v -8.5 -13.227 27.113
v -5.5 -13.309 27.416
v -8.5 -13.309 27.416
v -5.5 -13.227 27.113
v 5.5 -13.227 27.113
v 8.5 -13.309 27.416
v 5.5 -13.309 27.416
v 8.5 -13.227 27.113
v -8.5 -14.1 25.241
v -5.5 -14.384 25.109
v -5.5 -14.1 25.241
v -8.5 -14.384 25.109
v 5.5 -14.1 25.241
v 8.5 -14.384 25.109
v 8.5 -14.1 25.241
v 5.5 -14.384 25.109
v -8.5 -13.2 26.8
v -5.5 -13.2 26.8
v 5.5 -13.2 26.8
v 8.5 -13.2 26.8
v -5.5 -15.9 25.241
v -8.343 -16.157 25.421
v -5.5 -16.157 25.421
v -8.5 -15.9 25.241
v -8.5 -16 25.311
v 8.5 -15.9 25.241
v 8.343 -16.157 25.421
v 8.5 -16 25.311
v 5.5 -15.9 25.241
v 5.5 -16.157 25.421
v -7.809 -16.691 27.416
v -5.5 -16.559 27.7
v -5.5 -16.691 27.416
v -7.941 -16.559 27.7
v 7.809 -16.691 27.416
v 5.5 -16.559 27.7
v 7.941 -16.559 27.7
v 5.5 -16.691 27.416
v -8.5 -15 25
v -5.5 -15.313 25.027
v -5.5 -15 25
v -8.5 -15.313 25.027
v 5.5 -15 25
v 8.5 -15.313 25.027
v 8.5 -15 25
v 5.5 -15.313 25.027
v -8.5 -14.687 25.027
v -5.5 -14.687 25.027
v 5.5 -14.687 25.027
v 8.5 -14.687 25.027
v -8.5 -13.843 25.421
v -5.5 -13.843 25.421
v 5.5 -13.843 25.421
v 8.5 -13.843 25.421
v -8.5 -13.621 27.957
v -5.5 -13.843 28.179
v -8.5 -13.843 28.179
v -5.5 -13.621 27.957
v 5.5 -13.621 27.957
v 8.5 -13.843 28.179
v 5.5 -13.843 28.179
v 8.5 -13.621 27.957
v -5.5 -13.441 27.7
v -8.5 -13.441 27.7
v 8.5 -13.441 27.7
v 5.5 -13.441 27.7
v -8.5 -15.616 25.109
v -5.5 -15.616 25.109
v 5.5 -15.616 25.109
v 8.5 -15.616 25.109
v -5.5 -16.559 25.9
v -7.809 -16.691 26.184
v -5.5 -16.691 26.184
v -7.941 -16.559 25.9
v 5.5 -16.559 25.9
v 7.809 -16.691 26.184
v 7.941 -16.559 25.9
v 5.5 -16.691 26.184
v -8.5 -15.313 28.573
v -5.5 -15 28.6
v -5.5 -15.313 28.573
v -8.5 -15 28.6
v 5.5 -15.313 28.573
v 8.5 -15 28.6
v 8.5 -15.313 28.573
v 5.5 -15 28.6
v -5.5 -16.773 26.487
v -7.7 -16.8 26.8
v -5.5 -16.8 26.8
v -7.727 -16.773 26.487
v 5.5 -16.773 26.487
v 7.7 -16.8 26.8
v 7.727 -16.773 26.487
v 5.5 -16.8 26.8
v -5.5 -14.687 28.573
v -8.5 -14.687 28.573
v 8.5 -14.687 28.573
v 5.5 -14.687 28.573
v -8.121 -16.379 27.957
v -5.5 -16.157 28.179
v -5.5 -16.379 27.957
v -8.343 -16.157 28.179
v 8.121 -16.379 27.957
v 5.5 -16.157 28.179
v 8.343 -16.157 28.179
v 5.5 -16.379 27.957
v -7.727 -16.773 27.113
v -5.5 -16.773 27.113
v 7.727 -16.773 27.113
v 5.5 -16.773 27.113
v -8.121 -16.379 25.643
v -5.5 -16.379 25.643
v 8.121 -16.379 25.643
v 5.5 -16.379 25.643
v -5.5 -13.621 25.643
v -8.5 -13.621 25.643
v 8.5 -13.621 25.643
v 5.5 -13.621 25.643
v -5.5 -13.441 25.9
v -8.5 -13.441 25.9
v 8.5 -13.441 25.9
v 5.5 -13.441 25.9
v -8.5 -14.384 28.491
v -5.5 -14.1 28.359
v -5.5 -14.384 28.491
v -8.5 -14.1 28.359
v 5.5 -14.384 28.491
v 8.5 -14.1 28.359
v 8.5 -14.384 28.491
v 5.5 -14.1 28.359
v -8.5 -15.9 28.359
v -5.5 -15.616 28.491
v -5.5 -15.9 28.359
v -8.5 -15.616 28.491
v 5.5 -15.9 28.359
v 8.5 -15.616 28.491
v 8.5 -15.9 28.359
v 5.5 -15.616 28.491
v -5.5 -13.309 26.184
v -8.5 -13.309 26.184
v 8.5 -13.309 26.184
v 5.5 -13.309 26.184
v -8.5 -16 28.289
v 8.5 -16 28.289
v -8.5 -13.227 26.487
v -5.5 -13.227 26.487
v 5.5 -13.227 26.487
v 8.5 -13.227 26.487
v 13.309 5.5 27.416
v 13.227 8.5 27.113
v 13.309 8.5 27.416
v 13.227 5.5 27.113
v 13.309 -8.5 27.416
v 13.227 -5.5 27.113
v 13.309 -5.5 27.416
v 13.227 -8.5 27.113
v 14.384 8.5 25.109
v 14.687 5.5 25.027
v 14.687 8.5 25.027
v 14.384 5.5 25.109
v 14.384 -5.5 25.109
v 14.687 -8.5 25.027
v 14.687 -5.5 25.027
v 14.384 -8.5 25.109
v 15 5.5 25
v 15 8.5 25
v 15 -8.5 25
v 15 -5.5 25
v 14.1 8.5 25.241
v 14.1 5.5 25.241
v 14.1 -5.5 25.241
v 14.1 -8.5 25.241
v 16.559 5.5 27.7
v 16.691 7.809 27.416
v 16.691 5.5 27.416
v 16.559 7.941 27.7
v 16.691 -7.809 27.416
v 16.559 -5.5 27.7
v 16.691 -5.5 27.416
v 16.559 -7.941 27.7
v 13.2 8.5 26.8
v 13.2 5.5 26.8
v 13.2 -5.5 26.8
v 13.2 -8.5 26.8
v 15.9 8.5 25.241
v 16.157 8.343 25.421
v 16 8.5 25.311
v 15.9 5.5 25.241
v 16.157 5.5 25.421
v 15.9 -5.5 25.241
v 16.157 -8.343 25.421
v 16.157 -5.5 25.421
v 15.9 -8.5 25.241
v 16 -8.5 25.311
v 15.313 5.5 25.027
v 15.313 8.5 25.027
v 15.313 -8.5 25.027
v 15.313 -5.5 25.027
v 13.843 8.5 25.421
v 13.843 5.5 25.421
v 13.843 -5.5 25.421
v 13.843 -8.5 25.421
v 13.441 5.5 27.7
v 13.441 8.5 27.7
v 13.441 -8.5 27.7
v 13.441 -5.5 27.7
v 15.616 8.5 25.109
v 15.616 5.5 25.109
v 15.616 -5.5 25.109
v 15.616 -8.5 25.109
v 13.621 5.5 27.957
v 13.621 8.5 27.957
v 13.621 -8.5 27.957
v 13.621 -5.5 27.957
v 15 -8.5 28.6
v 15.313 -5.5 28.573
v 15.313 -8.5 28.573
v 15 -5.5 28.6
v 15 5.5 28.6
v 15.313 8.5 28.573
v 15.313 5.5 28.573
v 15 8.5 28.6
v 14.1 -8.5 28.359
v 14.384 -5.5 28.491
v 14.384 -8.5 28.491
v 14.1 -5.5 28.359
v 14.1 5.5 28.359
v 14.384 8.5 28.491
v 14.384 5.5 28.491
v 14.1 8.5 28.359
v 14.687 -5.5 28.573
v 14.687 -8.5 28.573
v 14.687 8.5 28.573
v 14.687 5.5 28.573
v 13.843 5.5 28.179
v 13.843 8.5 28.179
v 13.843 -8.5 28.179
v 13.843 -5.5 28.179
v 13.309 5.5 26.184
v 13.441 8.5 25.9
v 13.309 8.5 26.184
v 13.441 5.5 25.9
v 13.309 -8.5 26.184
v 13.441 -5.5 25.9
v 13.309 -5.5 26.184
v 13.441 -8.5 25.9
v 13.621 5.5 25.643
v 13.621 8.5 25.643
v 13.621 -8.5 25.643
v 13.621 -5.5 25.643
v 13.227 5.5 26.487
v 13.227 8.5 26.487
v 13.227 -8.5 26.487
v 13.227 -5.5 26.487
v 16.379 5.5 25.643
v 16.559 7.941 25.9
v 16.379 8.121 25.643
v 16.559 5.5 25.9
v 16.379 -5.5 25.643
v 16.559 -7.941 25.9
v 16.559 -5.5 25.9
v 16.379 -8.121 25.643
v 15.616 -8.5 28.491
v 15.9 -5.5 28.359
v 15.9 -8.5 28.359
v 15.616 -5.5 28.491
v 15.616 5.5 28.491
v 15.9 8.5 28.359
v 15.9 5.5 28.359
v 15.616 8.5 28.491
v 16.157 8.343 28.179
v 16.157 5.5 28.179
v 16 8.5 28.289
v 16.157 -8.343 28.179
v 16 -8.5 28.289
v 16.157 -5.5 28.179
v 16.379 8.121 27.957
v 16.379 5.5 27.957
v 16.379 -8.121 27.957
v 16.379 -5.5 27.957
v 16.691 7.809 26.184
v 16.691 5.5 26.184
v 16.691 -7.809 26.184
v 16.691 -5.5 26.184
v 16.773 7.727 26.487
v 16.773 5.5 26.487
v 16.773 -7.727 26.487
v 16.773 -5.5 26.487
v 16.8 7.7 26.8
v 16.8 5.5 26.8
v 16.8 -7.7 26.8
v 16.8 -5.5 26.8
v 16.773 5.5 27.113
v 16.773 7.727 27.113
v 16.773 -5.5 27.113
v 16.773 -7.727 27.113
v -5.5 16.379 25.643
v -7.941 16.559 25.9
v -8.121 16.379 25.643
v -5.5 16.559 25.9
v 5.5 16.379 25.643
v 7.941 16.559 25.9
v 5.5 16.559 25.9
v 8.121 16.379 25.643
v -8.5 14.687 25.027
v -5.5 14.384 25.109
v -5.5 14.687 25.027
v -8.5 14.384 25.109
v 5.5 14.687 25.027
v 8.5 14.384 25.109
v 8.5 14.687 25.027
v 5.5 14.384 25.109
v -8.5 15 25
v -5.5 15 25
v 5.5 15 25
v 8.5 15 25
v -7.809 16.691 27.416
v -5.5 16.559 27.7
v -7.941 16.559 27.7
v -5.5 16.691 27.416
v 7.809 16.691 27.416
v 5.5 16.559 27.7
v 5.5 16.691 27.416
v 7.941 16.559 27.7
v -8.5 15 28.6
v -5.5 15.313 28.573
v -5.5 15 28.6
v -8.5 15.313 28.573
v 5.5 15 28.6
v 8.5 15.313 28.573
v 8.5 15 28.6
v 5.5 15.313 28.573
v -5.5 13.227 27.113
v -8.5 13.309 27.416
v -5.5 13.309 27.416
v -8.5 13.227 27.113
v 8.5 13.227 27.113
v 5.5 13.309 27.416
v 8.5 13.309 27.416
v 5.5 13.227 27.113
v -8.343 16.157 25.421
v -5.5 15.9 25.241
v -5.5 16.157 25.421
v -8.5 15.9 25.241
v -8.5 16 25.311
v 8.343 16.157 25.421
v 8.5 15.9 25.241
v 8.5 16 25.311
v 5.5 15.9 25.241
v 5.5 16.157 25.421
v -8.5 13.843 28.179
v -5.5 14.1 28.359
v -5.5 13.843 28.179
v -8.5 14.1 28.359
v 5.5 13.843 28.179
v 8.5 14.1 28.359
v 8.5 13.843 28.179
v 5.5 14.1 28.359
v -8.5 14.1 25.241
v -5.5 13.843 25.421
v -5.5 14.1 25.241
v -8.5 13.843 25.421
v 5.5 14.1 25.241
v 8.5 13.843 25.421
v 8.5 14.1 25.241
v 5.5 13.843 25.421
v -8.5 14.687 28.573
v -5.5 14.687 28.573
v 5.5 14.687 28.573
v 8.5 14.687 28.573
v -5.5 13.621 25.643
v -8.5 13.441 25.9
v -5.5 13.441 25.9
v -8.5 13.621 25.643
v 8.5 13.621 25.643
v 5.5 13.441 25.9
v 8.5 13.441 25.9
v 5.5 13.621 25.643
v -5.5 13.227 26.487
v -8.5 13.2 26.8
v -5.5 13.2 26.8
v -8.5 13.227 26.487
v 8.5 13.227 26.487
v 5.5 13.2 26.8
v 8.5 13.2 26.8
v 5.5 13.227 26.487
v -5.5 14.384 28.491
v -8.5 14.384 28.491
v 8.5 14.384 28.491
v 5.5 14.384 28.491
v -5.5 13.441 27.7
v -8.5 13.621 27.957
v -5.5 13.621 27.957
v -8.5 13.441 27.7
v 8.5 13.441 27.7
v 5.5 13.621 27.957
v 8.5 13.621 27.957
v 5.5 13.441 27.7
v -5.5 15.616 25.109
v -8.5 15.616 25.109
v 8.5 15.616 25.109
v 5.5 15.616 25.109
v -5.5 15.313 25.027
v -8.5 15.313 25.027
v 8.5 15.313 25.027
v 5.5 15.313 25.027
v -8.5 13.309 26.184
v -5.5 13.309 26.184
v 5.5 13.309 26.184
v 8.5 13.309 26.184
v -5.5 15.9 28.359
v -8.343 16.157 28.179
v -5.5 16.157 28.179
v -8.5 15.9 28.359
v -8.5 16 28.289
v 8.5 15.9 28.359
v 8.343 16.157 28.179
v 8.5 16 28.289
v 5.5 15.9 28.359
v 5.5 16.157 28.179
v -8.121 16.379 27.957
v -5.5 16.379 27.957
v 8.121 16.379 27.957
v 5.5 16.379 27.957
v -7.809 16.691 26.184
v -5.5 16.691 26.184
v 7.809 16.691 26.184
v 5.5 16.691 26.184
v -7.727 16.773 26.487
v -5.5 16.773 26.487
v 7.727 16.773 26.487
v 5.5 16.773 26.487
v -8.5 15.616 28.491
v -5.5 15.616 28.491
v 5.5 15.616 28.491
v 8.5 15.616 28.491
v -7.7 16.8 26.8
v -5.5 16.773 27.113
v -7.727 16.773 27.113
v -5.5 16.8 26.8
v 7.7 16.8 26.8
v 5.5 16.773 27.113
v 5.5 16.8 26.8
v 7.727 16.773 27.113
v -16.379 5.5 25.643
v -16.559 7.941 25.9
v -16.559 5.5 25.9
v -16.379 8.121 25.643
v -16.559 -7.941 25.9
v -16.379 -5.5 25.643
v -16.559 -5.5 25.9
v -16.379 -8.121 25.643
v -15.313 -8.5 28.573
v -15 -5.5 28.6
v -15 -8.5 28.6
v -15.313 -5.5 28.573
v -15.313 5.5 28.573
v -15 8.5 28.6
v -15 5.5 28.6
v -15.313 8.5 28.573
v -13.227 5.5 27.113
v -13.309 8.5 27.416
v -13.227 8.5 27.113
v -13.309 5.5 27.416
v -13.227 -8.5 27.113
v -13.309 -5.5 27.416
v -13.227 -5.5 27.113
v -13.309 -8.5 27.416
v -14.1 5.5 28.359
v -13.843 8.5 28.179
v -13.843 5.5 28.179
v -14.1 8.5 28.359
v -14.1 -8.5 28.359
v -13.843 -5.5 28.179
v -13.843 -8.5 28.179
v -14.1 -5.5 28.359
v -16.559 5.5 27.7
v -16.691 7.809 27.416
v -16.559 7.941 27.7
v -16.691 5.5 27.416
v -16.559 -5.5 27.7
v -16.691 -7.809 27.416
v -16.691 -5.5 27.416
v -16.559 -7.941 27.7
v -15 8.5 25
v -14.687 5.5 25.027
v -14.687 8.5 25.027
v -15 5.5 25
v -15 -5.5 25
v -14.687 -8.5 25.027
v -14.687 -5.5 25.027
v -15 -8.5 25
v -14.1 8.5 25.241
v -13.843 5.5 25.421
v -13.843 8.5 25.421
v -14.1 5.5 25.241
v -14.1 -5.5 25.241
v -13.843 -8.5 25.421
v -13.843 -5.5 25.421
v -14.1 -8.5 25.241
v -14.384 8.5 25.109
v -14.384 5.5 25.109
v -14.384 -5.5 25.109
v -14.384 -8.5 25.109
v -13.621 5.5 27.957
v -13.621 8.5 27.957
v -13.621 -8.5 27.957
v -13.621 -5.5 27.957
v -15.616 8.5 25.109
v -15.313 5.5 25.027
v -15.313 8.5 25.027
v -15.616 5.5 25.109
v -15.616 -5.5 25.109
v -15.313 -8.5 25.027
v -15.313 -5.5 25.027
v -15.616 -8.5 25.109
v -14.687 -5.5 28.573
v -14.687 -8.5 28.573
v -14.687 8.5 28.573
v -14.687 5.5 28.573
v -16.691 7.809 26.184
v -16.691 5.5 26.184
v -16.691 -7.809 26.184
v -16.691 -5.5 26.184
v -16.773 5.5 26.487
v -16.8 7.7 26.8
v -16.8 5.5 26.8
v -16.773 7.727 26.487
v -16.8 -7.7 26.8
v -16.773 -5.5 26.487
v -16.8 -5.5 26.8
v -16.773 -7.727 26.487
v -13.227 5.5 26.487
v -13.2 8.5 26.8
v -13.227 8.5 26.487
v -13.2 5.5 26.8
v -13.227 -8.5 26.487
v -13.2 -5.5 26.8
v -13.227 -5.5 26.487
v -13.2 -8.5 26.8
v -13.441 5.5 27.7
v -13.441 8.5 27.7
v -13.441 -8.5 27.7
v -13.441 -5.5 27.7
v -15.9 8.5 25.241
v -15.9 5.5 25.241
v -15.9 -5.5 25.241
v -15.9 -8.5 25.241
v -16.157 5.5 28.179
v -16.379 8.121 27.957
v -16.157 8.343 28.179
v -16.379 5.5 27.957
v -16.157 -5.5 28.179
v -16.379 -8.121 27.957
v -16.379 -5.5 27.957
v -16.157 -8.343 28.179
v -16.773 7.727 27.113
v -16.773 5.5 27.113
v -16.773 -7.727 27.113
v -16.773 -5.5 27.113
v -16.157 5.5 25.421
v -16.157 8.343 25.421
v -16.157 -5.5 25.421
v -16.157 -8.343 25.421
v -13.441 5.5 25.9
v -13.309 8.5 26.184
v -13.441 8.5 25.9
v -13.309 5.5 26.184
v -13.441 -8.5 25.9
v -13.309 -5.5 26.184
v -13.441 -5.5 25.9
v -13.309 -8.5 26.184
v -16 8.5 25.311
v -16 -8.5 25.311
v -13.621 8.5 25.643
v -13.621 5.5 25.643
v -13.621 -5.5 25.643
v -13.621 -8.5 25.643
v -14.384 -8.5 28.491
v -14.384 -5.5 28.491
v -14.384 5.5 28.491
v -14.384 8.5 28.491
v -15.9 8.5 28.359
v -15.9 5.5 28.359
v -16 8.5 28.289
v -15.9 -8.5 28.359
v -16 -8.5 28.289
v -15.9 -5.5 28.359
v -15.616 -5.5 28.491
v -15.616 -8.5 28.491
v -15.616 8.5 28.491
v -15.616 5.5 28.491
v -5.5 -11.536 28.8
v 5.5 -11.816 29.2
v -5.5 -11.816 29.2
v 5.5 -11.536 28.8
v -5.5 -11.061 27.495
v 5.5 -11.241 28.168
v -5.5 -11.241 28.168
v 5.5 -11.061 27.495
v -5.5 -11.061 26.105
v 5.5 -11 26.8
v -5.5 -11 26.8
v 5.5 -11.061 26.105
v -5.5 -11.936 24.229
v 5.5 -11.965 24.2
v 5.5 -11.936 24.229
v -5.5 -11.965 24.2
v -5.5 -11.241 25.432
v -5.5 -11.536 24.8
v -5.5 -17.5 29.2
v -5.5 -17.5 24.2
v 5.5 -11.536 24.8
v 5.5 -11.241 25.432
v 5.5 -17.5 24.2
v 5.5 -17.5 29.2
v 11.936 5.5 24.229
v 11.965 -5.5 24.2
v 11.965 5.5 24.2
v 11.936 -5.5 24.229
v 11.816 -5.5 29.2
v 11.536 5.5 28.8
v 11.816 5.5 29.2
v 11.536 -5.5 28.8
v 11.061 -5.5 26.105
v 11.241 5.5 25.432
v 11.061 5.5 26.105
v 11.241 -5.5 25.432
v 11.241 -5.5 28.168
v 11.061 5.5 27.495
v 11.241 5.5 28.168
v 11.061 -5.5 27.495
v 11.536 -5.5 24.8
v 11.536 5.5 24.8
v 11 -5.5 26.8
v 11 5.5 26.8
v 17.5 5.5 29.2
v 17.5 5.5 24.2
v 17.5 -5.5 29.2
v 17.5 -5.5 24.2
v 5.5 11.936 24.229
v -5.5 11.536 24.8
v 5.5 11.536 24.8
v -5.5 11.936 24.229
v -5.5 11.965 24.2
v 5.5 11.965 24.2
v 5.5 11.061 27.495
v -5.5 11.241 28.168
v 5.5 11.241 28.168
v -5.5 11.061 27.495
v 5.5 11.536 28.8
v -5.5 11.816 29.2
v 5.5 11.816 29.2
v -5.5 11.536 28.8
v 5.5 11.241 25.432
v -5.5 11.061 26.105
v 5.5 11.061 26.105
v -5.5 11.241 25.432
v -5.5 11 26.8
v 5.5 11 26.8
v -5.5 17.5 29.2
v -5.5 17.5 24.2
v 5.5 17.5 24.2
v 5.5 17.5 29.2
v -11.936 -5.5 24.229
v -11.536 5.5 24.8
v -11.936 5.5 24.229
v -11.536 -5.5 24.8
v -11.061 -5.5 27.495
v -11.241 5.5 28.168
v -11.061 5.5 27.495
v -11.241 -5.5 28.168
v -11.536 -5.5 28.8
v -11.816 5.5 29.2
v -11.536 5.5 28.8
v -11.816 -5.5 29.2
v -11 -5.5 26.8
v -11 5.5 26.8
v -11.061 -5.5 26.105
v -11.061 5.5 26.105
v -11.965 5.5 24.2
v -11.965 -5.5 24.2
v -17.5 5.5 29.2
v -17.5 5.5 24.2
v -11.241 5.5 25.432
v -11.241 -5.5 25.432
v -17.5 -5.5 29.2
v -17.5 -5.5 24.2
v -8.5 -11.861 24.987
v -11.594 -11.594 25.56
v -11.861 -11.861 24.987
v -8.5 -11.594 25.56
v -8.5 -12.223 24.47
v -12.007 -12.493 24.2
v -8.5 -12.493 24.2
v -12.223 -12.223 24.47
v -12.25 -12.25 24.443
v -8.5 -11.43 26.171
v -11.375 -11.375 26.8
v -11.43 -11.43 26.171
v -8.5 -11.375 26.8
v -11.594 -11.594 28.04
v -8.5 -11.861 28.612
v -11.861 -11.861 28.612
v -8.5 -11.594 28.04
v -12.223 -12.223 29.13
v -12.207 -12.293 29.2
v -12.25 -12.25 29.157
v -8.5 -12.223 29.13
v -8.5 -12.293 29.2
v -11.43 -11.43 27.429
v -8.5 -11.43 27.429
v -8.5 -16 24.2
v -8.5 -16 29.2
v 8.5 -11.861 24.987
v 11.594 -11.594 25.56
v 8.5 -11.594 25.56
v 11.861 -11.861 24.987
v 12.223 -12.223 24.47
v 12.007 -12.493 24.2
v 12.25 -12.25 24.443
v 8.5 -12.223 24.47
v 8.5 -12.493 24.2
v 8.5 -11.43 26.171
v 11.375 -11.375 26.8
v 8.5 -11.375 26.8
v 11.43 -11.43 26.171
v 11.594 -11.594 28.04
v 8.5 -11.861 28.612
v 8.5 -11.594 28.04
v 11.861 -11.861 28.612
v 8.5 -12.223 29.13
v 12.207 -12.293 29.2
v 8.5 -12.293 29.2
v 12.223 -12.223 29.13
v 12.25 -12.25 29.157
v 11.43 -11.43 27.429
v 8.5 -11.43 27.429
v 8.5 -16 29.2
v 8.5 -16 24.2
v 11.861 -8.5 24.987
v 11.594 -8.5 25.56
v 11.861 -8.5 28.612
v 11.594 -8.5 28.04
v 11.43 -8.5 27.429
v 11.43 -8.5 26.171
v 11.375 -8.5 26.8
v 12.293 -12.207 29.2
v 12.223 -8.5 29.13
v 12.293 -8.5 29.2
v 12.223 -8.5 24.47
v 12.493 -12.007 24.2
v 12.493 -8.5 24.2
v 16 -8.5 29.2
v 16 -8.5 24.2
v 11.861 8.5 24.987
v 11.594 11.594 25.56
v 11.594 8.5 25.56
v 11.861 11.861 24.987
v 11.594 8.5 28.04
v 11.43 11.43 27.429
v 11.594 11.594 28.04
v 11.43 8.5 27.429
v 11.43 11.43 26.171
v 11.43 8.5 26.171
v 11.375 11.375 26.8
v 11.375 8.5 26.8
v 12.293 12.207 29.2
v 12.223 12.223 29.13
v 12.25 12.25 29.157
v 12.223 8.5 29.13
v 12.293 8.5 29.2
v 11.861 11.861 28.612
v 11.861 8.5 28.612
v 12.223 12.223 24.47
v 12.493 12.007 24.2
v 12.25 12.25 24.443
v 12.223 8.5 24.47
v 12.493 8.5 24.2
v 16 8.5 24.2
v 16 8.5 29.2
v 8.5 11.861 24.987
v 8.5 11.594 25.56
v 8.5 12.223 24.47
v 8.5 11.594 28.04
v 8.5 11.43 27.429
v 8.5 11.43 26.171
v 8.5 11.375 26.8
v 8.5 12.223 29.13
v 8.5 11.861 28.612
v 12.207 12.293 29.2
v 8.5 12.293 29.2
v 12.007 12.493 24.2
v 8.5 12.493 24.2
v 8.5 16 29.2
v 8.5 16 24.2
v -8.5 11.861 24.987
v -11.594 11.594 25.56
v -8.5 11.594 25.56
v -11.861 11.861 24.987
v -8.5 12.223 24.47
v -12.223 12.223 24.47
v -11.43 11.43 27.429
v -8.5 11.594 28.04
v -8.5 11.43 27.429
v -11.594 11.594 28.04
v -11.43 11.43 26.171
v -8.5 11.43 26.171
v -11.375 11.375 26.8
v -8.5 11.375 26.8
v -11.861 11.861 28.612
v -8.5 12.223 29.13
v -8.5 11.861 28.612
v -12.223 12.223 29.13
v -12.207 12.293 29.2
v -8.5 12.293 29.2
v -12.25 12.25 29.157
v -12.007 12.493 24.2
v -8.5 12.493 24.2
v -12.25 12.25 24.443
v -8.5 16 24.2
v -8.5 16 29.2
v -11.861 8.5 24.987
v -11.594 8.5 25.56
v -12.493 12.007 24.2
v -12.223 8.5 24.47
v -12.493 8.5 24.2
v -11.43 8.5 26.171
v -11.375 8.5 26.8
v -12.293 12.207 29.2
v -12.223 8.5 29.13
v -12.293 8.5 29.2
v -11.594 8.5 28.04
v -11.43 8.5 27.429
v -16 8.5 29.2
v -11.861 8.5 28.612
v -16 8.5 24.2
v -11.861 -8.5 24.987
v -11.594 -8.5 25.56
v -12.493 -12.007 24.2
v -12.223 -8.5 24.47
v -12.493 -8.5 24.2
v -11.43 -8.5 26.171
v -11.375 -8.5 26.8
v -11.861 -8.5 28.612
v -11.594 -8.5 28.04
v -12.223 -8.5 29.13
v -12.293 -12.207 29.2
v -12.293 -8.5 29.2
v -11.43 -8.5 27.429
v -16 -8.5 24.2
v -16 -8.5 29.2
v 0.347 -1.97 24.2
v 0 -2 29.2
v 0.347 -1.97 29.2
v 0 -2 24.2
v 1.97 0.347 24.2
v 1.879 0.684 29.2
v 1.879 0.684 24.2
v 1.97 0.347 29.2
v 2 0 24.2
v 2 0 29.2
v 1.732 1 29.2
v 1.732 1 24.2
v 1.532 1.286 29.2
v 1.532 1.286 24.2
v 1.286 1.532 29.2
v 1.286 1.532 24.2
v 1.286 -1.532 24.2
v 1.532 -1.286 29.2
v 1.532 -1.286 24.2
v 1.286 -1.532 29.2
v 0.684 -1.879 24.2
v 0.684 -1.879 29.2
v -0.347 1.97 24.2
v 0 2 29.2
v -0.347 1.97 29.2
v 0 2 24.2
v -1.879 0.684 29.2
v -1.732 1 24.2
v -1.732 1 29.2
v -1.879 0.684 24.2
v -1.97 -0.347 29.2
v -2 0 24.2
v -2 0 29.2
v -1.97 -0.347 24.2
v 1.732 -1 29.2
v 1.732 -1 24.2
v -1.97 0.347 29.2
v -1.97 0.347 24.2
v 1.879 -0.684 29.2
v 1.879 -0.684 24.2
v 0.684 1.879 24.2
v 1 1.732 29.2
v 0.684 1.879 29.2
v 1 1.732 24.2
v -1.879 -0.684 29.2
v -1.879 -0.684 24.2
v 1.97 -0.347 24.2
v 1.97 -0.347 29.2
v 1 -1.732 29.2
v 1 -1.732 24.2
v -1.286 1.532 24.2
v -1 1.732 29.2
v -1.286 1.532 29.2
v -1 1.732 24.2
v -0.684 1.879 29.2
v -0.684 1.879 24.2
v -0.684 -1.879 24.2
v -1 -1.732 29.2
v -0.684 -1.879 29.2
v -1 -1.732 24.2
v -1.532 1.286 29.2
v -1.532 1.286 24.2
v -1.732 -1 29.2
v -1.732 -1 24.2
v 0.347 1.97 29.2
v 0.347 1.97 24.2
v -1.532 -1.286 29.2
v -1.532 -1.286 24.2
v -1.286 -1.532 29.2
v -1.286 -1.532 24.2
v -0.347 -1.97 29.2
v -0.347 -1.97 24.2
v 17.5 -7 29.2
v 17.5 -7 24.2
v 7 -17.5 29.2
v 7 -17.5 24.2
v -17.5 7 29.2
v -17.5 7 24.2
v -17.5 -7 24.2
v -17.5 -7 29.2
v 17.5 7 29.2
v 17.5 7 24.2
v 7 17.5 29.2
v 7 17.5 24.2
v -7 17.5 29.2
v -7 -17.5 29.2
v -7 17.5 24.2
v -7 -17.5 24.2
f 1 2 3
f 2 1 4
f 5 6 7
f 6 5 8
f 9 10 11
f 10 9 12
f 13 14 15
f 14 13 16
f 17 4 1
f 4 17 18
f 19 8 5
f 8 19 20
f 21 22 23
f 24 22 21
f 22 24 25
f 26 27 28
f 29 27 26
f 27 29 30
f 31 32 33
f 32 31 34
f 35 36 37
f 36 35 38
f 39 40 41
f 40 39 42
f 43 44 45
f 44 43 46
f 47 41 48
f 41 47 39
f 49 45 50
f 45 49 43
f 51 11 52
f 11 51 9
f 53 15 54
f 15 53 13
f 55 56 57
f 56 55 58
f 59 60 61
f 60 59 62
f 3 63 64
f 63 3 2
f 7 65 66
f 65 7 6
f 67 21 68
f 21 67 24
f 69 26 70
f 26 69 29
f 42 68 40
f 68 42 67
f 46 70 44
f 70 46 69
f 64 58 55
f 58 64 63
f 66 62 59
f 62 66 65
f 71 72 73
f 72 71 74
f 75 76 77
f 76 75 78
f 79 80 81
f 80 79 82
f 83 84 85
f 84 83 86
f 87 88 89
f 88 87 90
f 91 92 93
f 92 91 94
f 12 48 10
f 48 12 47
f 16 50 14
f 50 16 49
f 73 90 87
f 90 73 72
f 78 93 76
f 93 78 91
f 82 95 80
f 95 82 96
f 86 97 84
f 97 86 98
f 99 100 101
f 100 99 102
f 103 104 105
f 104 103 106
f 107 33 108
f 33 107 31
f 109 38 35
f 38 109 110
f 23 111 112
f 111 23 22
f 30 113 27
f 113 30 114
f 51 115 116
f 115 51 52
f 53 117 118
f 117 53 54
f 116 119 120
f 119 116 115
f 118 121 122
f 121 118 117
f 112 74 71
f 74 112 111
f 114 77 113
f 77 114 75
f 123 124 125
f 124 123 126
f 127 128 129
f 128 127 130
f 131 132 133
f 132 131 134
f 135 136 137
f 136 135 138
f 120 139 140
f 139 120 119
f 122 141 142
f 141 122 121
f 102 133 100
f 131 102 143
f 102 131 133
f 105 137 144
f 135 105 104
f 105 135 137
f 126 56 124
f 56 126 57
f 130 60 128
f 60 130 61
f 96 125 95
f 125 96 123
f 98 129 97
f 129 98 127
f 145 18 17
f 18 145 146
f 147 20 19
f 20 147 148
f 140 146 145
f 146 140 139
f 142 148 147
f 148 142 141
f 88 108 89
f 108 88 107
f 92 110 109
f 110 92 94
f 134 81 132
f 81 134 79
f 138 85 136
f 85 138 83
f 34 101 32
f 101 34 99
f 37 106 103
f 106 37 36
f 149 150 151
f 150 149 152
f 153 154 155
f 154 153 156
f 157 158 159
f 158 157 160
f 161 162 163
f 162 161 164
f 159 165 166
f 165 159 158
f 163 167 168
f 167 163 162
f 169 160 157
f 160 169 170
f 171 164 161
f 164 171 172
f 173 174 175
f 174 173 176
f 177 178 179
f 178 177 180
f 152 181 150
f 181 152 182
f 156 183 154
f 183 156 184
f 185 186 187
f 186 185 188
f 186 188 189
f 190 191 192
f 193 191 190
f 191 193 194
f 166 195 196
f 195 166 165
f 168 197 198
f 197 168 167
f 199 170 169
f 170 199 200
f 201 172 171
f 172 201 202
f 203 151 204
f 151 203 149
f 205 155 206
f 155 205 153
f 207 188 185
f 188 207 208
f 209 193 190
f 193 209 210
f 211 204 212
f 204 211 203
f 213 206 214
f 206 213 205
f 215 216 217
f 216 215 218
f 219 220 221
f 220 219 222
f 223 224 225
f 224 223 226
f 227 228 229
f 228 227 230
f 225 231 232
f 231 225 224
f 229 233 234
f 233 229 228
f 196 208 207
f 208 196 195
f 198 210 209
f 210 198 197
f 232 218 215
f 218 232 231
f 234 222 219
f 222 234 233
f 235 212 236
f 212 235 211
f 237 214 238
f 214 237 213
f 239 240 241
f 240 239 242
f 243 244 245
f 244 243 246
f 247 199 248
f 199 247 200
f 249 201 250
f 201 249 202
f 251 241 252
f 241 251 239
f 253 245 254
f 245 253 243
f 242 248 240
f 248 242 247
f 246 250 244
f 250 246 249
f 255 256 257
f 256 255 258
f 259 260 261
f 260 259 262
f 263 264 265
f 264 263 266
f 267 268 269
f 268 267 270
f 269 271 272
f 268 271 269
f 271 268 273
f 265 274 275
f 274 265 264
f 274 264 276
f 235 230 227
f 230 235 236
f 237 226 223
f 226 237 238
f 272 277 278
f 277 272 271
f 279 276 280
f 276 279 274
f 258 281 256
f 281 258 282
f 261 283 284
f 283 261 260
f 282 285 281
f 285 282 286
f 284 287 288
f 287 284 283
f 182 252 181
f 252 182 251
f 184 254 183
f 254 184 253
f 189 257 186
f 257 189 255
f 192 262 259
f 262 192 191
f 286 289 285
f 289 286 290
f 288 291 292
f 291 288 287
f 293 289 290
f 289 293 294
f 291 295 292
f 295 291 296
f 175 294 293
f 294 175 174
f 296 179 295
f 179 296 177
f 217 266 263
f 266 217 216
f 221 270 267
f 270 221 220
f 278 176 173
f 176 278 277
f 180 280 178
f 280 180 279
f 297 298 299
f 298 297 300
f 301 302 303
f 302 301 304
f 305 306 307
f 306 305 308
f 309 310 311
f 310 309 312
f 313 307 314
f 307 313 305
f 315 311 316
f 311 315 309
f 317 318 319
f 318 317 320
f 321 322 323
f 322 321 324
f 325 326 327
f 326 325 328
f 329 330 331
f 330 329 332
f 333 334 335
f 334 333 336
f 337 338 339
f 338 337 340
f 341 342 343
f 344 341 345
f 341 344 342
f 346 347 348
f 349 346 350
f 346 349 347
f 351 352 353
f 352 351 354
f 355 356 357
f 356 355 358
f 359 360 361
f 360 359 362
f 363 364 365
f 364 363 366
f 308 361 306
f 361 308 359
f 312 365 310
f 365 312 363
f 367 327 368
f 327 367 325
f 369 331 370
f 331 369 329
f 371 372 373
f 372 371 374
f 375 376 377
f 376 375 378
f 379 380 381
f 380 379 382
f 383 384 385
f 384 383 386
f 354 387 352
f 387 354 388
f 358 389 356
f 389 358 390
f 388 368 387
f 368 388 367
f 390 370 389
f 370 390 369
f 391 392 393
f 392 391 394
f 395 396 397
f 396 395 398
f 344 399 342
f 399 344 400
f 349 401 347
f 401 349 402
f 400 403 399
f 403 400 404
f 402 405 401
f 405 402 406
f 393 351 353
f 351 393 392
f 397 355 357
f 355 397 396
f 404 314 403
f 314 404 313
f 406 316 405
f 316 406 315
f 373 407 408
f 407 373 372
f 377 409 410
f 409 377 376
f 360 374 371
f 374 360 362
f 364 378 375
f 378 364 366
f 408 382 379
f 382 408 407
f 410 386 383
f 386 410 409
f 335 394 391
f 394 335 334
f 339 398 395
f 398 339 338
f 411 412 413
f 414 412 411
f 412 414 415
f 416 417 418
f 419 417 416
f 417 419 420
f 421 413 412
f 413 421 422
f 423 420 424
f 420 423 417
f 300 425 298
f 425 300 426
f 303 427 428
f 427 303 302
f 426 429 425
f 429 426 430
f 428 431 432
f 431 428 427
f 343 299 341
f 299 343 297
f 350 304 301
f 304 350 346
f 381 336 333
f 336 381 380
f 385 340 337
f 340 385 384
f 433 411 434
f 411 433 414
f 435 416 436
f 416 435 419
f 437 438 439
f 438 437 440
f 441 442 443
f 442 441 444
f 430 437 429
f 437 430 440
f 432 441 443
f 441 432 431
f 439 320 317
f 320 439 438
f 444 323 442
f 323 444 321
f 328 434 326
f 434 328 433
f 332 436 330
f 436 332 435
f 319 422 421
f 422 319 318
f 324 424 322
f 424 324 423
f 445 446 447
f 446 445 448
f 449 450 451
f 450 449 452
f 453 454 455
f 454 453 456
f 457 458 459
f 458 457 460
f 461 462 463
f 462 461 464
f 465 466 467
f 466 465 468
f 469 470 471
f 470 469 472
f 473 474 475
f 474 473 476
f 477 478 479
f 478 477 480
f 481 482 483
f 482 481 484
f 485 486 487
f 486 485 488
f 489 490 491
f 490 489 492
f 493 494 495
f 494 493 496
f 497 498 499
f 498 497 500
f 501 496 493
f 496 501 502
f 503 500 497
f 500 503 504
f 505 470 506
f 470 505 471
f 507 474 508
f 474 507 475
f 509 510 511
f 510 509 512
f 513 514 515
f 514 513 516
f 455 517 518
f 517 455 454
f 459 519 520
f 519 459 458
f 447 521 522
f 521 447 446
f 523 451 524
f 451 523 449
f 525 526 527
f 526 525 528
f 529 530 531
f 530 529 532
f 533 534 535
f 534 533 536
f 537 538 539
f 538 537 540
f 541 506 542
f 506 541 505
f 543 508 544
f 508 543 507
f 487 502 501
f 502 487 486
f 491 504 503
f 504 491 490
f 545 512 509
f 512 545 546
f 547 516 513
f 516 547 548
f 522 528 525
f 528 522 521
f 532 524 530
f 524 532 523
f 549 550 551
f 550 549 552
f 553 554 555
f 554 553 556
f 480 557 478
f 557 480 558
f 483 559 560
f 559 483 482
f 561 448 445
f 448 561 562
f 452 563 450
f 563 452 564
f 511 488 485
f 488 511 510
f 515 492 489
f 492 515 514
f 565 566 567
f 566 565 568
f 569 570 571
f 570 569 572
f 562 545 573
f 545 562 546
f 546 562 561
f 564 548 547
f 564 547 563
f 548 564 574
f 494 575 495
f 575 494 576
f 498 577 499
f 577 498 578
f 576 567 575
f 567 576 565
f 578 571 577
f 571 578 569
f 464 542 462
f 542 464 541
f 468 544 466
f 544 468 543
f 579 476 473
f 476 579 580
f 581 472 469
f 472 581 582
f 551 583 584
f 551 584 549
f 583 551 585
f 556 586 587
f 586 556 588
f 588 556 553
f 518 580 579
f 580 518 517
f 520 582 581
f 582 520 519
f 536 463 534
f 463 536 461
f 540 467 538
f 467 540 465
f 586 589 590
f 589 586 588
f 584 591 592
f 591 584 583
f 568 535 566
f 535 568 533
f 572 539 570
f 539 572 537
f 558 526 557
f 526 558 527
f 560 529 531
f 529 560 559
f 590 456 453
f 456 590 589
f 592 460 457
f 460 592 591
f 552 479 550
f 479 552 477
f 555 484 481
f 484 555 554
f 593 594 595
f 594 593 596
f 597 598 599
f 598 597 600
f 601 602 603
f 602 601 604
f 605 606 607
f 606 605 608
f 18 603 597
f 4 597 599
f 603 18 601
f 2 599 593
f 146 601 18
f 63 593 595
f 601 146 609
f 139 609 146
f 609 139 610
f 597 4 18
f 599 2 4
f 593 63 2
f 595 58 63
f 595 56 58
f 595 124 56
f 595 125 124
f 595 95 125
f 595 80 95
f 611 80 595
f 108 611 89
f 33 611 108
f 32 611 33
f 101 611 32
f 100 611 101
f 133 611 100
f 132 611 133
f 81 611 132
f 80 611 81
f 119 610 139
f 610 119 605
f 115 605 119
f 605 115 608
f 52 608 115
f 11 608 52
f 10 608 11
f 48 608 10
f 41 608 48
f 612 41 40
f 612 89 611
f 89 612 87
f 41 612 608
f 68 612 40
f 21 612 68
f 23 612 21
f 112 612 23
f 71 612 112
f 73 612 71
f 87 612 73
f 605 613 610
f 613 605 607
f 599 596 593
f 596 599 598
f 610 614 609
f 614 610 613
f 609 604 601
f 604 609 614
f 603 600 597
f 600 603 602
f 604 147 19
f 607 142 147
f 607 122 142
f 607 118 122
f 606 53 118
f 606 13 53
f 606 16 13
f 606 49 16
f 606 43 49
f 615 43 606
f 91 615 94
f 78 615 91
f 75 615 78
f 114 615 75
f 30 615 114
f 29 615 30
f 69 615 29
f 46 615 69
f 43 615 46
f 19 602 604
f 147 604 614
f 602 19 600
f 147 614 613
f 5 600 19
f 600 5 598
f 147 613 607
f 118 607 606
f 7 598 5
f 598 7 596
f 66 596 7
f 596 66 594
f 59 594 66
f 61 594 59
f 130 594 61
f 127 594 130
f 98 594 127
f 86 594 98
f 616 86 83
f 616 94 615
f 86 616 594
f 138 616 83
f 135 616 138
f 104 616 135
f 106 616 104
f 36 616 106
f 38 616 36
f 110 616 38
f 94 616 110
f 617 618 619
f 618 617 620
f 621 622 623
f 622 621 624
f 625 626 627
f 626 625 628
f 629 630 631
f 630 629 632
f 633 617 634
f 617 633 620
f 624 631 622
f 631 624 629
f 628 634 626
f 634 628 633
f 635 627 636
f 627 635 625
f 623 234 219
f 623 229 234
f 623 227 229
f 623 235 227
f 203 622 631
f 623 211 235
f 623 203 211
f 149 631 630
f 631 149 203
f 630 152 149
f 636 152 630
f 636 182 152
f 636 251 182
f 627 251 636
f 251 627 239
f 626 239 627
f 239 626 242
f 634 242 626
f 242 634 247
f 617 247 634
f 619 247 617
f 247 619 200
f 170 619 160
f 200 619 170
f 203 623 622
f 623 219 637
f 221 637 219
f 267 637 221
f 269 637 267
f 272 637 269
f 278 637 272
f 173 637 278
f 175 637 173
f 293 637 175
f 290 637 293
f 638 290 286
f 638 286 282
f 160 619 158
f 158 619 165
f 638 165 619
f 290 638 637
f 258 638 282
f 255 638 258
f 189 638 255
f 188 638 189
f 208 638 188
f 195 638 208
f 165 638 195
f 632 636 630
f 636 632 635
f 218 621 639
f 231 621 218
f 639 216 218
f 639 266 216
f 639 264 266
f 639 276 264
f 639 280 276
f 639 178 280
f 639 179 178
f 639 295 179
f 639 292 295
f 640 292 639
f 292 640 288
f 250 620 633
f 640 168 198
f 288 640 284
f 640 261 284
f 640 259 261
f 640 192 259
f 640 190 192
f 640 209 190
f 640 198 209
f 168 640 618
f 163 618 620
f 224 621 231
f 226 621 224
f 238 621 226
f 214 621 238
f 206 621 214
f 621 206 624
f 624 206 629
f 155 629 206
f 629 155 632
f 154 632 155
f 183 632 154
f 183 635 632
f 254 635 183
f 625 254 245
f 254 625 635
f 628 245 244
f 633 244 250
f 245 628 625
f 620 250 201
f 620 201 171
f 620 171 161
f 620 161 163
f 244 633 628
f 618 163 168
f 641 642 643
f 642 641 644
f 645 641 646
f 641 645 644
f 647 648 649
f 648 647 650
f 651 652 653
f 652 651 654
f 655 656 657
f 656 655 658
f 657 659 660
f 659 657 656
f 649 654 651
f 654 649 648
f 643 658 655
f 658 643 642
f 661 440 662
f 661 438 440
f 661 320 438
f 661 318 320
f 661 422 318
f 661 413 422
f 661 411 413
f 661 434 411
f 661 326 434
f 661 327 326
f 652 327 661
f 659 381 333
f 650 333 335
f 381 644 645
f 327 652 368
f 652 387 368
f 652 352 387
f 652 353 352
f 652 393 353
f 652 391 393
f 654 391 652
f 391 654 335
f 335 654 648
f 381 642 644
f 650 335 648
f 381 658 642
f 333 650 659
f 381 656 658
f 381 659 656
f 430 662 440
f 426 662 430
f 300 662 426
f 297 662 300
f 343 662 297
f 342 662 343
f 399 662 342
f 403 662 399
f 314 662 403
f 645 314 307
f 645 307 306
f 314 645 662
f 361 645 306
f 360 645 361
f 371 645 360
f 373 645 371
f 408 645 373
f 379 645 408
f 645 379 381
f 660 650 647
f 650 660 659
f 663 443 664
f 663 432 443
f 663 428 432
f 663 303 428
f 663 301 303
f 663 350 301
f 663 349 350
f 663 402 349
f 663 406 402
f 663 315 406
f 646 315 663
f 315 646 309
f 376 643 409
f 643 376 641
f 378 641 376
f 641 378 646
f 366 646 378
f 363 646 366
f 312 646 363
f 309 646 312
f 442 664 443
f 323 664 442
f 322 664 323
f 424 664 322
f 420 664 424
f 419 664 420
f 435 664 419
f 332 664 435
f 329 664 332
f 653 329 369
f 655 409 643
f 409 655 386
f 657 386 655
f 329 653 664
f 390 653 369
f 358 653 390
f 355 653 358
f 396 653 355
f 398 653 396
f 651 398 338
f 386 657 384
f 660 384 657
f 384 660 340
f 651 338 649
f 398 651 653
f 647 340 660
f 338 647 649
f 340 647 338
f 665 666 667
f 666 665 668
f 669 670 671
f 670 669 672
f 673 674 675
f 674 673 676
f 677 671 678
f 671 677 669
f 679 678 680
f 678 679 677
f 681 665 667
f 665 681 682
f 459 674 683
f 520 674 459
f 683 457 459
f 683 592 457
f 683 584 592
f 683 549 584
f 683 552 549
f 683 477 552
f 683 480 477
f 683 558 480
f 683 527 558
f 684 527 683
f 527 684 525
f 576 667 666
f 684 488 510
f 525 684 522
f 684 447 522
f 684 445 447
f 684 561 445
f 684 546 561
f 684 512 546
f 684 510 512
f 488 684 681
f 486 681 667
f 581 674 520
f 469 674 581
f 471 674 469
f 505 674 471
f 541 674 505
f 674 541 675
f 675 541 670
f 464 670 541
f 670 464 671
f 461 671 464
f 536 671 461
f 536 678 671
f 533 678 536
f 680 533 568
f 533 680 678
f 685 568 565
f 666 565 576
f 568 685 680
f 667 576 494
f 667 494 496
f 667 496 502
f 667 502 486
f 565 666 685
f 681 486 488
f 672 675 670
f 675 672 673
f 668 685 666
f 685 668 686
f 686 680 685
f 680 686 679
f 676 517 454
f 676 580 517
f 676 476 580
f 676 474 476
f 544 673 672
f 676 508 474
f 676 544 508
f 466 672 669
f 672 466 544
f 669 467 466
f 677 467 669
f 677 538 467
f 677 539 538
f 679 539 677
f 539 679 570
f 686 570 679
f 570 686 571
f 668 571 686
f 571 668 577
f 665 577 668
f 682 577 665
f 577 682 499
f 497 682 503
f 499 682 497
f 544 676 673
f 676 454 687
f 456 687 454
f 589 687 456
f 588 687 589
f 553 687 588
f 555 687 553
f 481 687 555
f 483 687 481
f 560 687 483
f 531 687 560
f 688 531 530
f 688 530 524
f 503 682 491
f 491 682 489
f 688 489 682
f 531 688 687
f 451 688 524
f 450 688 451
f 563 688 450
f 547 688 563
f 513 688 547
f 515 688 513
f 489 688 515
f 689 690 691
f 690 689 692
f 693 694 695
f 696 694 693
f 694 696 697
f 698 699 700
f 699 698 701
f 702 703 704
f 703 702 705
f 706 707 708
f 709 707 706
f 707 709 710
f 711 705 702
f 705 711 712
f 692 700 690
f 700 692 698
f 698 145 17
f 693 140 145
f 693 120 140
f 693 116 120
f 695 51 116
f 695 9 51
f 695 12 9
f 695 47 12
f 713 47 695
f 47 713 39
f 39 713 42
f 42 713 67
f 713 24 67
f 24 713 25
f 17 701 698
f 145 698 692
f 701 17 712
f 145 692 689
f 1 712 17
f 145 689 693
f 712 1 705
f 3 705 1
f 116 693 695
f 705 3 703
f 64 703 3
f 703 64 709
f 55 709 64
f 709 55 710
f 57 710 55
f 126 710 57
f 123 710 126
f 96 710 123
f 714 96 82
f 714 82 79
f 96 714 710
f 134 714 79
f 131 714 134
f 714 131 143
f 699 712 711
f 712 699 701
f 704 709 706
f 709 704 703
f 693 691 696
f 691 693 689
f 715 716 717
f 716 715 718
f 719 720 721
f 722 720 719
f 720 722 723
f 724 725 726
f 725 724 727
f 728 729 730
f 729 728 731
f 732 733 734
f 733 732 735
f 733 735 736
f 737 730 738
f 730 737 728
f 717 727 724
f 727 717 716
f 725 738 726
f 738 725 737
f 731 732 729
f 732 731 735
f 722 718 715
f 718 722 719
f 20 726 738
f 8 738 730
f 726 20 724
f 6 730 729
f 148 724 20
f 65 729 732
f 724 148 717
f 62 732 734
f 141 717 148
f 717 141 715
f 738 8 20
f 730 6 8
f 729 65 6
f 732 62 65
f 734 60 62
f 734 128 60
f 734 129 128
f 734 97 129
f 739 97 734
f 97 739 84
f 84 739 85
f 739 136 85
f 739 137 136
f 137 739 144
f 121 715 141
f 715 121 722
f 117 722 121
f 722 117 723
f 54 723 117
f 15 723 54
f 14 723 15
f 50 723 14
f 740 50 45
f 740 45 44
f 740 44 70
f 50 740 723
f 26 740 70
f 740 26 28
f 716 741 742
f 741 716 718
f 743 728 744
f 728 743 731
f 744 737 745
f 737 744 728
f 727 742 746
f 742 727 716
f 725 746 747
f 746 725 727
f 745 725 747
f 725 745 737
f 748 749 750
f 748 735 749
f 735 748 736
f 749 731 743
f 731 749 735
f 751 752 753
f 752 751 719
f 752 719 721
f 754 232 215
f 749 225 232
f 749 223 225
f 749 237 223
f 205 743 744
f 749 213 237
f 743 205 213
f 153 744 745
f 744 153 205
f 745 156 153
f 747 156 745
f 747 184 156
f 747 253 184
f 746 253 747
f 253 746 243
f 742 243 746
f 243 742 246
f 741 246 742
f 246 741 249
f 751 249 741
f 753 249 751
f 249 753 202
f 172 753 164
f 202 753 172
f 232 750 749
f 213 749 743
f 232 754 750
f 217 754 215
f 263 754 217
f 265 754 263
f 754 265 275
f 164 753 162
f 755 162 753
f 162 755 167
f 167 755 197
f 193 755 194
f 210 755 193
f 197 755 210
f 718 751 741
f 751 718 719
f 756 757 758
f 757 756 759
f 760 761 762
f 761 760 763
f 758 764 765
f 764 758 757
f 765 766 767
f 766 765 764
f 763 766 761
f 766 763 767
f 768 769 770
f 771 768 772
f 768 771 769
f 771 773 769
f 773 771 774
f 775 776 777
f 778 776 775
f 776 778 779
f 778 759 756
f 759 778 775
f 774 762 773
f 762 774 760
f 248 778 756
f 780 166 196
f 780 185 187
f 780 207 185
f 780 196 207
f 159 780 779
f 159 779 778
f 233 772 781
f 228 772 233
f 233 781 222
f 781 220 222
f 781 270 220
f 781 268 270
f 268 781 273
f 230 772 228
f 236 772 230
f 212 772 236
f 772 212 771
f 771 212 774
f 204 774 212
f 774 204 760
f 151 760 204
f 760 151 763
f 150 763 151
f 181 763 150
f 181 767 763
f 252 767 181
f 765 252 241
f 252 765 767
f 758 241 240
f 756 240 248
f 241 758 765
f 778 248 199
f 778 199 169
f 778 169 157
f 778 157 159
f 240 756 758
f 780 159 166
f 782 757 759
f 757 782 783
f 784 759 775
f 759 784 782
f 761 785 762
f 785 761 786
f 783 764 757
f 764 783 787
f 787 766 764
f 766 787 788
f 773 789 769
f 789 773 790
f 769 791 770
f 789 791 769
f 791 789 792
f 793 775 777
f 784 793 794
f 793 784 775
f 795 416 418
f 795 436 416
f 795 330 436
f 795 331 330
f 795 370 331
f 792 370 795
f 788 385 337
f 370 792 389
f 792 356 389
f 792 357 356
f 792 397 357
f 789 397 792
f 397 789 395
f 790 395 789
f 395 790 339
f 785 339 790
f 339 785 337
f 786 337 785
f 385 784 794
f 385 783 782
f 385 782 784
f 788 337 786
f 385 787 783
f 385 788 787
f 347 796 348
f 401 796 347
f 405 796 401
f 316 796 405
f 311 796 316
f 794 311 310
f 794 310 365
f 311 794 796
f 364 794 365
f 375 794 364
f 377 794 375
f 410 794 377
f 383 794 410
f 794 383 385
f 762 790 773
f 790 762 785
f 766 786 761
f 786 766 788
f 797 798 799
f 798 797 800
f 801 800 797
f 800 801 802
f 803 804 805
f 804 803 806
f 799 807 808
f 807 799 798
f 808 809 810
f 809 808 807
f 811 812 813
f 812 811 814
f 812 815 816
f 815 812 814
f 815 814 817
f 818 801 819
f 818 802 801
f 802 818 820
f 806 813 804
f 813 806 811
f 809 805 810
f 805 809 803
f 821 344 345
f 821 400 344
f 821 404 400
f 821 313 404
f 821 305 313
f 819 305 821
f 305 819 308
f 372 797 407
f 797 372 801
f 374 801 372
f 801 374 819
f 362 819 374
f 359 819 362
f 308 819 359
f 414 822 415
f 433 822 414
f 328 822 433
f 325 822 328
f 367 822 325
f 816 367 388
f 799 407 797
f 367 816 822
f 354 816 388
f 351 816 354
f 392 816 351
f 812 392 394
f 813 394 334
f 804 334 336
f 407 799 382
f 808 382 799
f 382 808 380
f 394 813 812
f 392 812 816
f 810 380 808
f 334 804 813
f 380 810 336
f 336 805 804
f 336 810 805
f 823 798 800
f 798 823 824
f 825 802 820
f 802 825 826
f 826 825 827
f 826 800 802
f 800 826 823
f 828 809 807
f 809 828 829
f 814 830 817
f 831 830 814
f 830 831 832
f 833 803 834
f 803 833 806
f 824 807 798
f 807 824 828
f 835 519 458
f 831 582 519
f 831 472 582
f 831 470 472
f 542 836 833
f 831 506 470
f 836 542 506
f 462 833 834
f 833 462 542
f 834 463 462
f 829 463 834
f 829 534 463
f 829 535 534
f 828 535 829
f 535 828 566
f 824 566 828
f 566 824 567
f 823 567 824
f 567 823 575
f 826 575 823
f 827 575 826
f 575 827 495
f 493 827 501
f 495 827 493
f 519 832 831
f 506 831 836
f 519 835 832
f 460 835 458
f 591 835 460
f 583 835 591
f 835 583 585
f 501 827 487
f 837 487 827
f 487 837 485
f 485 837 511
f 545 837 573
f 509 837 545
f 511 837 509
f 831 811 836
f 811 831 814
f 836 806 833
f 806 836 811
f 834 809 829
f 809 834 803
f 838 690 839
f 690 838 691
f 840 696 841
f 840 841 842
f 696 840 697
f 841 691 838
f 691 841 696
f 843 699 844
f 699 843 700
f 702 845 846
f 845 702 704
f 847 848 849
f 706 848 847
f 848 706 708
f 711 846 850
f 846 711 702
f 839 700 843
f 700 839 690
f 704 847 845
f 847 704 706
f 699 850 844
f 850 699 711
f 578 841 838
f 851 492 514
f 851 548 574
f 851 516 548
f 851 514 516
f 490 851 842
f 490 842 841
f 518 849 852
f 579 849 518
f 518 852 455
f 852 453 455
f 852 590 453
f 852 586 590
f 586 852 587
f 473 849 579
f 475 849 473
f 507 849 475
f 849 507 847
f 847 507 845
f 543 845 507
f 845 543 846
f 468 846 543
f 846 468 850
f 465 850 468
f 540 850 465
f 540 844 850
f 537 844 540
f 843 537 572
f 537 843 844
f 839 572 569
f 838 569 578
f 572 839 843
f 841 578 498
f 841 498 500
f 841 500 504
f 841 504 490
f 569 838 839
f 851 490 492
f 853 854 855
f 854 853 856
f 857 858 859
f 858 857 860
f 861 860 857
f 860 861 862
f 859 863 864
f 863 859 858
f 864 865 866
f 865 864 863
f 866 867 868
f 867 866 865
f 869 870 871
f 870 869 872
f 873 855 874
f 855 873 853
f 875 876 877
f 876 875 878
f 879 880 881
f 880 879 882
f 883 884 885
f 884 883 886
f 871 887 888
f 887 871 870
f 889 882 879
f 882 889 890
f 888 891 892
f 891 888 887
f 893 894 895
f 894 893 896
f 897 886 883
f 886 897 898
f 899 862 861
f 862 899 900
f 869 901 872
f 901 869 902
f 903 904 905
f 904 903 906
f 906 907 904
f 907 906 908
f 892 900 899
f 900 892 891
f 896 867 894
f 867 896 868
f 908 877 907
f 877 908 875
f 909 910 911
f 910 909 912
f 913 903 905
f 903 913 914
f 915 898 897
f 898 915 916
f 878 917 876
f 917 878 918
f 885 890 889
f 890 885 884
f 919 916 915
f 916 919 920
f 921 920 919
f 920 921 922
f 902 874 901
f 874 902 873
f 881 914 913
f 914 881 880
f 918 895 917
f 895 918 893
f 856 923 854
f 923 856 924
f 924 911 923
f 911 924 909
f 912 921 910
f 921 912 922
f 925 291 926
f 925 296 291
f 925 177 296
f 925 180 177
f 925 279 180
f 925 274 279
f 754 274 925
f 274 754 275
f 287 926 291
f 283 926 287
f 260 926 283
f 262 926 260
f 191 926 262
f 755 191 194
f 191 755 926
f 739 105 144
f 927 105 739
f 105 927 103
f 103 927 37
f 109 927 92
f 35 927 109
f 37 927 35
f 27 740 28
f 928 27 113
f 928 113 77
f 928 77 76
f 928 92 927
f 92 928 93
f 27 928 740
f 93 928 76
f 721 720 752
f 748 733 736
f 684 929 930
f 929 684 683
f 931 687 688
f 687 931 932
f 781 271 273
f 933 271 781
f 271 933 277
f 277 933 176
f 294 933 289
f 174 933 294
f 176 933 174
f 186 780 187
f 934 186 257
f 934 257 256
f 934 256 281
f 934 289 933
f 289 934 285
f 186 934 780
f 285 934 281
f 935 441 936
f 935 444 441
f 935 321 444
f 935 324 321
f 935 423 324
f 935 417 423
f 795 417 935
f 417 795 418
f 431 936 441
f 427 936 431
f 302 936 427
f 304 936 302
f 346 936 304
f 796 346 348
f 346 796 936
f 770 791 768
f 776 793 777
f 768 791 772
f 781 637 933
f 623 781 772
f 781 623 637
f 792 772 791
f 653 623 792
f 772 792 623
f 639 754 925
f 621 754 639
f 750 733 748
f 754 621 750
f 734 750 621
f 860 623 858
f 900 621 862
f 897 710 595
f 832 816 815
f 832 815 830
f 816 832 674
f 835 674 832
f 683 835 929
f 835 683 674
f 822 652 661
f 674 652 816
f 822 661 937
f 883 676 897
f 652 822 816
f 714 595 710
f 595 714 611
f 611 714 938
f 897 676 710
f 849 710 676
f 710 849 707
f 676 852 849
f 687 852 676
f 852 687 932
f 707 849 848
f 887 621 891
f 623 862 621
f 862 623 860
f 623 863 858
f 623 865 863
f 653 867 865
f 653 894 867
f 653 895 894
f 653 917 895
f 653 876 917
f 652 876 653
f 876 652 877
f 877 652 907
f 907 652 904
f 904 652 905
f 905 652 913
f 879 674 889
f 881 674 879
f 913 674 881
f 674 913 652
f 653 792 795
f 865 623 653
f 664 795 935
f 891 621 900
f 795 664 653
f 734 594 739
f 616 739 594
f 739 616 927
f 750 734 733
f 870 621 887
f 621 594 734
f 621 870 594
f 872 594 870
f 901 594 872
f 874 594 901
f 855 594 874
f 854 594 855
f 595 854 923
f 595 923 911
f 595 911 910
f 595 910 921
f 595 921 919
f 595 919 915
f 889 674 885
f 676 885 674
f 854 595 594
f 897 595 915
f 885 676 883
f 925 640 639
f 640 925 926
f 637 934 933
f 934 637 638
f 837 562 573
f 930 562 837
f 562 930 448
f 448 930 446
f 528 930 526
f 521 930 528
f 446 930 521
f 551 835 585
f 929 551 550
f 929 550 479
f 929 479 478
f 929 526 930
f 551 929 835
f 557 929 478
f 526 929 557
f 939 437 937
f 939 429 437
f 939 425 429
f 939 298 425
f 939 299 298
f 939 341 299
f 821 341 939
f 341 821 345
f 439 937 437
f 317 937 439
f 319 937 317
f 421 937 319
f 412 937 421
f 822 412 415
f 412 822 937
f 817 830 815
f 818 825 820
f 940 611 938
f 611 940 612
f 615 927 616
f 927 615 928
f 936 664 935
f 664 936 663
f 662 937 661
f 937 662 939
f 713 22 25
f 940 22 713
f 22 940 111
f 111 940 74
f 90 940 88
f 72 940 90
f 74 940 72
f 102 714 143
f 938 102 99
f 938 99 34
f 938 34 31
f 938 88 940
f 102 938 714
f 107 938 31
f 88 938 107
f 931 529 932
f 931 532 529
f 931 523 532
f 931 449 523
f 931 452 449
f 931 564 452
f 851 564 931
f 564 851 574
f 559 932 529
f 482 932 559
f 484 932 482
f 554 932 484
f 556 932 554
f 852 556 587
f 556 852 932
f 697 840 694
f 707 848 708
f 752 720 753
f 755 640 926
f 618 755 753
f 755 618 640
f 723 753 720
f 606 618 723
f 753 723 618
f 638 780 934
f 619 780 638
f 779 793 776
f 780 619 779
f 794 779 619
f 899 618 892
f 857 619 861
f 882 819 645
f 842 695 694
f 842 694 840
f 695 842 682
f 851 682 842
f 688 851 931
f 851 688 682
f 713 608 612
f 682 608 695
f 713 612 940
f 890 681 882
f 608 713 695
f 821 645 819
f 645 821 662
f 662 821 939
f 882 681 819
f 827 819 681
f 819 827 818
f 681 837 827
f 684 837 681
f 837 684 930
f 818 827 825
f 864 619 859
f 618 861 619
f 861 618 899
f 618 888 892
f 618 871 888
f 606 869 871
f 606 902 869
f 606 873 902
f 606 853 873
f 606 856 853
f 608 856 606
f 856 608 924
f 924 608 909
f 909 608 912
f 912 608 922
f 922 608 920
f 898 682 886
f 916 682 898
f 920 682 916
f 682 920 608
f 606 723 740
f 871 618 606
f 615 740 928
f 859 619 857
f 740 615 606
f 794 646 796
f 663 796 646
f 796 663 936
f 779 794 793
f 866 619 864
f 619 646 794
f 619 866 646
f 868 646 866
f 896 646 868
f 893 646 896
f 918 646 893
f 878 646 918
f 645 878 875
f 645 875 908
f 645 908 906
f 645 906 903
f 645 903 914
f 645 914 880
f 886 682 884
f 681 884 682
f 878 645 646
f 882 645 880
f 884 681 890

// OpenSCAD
module spring_end(width) {
    difference() {
        cylinder(h=width,d=5,$fn=36);
        translate([0,0,-1]) cylinder(h=width+2,d=3.6,$fn=36);
    }
}

module rubber_band_clip(width) {
   difference() {
       cylinder(h=width,d=6,$fn=36); 
       translate([0,0,-1]) cylinder(h=width+2,d=4,$fn=36);
   }
}

module spring(length, width) {
    union() {
        translate([-length/2-1.8,0,0]) spring_end(width);
        translate([length/2+1.8,0,0]) spring_end(width);
        translate([-length/2,-1,0]) cube([length,2,width]);
        translate([0,-2,0]) rubber_band_clip(width);
        translate([-length/4,-2,0]) rubber_band_clip(width);
        translate([length/4,-2,0]) rubber_band_clip(width);
    }
}

module end(length, width) {
    difference() {
        hull() for(i = [0,90,180,270]) {
            rotate([0,0,i]) translate([-width/2-2,-17.5,length/2-0.8]) cube([width+4,5,5]);
        }

        union() {
            for(i = [0,90,180,270]) {
                rotate([0,0,i]) translate([-width/2-10,-15,length/2+1.8])rotate([0,90,0]) cylinder(h=width+20,d=3.6,$fn=36);
            }
            for(i = [0,90,180,270]) {
            rotate([0,0,i]) translate([-width/2-0.5,-15,length/2+1.8])   rotate([0,90,0]) cylinder(h=width+1,d=8,$fn=36);
            }
            for(i = [0,90,180,270]) {
                rotate([0,0,i]) translate([-width/2-8.5,-15,length/2+1.8])rotate([0,90,0]) cylinder(h=5,d=7.25,$fn=36);
            
            rotate([0,0,i]) translate([-width/2+13.5,-15,length/2+1.8])rotate([0,90,0]) cylinder(h=5,d=7.25,$fn=36);
            }
            
        translate([0,0,length/2-1]) cylinder(h=6,d=4,$fn=36);
        }
    }
}

length = 50;
width = 10;

//for(i = [0,90,180,270]) {
//    rotate([0,0,i]) translate([-width/2,15,0]) rotate([0,90,0]) spring(length, width);    
//}

end(length, width);
//translate([0,0,0]) rotate([180,0,0]) end(length, width);

//spring(length, width);
